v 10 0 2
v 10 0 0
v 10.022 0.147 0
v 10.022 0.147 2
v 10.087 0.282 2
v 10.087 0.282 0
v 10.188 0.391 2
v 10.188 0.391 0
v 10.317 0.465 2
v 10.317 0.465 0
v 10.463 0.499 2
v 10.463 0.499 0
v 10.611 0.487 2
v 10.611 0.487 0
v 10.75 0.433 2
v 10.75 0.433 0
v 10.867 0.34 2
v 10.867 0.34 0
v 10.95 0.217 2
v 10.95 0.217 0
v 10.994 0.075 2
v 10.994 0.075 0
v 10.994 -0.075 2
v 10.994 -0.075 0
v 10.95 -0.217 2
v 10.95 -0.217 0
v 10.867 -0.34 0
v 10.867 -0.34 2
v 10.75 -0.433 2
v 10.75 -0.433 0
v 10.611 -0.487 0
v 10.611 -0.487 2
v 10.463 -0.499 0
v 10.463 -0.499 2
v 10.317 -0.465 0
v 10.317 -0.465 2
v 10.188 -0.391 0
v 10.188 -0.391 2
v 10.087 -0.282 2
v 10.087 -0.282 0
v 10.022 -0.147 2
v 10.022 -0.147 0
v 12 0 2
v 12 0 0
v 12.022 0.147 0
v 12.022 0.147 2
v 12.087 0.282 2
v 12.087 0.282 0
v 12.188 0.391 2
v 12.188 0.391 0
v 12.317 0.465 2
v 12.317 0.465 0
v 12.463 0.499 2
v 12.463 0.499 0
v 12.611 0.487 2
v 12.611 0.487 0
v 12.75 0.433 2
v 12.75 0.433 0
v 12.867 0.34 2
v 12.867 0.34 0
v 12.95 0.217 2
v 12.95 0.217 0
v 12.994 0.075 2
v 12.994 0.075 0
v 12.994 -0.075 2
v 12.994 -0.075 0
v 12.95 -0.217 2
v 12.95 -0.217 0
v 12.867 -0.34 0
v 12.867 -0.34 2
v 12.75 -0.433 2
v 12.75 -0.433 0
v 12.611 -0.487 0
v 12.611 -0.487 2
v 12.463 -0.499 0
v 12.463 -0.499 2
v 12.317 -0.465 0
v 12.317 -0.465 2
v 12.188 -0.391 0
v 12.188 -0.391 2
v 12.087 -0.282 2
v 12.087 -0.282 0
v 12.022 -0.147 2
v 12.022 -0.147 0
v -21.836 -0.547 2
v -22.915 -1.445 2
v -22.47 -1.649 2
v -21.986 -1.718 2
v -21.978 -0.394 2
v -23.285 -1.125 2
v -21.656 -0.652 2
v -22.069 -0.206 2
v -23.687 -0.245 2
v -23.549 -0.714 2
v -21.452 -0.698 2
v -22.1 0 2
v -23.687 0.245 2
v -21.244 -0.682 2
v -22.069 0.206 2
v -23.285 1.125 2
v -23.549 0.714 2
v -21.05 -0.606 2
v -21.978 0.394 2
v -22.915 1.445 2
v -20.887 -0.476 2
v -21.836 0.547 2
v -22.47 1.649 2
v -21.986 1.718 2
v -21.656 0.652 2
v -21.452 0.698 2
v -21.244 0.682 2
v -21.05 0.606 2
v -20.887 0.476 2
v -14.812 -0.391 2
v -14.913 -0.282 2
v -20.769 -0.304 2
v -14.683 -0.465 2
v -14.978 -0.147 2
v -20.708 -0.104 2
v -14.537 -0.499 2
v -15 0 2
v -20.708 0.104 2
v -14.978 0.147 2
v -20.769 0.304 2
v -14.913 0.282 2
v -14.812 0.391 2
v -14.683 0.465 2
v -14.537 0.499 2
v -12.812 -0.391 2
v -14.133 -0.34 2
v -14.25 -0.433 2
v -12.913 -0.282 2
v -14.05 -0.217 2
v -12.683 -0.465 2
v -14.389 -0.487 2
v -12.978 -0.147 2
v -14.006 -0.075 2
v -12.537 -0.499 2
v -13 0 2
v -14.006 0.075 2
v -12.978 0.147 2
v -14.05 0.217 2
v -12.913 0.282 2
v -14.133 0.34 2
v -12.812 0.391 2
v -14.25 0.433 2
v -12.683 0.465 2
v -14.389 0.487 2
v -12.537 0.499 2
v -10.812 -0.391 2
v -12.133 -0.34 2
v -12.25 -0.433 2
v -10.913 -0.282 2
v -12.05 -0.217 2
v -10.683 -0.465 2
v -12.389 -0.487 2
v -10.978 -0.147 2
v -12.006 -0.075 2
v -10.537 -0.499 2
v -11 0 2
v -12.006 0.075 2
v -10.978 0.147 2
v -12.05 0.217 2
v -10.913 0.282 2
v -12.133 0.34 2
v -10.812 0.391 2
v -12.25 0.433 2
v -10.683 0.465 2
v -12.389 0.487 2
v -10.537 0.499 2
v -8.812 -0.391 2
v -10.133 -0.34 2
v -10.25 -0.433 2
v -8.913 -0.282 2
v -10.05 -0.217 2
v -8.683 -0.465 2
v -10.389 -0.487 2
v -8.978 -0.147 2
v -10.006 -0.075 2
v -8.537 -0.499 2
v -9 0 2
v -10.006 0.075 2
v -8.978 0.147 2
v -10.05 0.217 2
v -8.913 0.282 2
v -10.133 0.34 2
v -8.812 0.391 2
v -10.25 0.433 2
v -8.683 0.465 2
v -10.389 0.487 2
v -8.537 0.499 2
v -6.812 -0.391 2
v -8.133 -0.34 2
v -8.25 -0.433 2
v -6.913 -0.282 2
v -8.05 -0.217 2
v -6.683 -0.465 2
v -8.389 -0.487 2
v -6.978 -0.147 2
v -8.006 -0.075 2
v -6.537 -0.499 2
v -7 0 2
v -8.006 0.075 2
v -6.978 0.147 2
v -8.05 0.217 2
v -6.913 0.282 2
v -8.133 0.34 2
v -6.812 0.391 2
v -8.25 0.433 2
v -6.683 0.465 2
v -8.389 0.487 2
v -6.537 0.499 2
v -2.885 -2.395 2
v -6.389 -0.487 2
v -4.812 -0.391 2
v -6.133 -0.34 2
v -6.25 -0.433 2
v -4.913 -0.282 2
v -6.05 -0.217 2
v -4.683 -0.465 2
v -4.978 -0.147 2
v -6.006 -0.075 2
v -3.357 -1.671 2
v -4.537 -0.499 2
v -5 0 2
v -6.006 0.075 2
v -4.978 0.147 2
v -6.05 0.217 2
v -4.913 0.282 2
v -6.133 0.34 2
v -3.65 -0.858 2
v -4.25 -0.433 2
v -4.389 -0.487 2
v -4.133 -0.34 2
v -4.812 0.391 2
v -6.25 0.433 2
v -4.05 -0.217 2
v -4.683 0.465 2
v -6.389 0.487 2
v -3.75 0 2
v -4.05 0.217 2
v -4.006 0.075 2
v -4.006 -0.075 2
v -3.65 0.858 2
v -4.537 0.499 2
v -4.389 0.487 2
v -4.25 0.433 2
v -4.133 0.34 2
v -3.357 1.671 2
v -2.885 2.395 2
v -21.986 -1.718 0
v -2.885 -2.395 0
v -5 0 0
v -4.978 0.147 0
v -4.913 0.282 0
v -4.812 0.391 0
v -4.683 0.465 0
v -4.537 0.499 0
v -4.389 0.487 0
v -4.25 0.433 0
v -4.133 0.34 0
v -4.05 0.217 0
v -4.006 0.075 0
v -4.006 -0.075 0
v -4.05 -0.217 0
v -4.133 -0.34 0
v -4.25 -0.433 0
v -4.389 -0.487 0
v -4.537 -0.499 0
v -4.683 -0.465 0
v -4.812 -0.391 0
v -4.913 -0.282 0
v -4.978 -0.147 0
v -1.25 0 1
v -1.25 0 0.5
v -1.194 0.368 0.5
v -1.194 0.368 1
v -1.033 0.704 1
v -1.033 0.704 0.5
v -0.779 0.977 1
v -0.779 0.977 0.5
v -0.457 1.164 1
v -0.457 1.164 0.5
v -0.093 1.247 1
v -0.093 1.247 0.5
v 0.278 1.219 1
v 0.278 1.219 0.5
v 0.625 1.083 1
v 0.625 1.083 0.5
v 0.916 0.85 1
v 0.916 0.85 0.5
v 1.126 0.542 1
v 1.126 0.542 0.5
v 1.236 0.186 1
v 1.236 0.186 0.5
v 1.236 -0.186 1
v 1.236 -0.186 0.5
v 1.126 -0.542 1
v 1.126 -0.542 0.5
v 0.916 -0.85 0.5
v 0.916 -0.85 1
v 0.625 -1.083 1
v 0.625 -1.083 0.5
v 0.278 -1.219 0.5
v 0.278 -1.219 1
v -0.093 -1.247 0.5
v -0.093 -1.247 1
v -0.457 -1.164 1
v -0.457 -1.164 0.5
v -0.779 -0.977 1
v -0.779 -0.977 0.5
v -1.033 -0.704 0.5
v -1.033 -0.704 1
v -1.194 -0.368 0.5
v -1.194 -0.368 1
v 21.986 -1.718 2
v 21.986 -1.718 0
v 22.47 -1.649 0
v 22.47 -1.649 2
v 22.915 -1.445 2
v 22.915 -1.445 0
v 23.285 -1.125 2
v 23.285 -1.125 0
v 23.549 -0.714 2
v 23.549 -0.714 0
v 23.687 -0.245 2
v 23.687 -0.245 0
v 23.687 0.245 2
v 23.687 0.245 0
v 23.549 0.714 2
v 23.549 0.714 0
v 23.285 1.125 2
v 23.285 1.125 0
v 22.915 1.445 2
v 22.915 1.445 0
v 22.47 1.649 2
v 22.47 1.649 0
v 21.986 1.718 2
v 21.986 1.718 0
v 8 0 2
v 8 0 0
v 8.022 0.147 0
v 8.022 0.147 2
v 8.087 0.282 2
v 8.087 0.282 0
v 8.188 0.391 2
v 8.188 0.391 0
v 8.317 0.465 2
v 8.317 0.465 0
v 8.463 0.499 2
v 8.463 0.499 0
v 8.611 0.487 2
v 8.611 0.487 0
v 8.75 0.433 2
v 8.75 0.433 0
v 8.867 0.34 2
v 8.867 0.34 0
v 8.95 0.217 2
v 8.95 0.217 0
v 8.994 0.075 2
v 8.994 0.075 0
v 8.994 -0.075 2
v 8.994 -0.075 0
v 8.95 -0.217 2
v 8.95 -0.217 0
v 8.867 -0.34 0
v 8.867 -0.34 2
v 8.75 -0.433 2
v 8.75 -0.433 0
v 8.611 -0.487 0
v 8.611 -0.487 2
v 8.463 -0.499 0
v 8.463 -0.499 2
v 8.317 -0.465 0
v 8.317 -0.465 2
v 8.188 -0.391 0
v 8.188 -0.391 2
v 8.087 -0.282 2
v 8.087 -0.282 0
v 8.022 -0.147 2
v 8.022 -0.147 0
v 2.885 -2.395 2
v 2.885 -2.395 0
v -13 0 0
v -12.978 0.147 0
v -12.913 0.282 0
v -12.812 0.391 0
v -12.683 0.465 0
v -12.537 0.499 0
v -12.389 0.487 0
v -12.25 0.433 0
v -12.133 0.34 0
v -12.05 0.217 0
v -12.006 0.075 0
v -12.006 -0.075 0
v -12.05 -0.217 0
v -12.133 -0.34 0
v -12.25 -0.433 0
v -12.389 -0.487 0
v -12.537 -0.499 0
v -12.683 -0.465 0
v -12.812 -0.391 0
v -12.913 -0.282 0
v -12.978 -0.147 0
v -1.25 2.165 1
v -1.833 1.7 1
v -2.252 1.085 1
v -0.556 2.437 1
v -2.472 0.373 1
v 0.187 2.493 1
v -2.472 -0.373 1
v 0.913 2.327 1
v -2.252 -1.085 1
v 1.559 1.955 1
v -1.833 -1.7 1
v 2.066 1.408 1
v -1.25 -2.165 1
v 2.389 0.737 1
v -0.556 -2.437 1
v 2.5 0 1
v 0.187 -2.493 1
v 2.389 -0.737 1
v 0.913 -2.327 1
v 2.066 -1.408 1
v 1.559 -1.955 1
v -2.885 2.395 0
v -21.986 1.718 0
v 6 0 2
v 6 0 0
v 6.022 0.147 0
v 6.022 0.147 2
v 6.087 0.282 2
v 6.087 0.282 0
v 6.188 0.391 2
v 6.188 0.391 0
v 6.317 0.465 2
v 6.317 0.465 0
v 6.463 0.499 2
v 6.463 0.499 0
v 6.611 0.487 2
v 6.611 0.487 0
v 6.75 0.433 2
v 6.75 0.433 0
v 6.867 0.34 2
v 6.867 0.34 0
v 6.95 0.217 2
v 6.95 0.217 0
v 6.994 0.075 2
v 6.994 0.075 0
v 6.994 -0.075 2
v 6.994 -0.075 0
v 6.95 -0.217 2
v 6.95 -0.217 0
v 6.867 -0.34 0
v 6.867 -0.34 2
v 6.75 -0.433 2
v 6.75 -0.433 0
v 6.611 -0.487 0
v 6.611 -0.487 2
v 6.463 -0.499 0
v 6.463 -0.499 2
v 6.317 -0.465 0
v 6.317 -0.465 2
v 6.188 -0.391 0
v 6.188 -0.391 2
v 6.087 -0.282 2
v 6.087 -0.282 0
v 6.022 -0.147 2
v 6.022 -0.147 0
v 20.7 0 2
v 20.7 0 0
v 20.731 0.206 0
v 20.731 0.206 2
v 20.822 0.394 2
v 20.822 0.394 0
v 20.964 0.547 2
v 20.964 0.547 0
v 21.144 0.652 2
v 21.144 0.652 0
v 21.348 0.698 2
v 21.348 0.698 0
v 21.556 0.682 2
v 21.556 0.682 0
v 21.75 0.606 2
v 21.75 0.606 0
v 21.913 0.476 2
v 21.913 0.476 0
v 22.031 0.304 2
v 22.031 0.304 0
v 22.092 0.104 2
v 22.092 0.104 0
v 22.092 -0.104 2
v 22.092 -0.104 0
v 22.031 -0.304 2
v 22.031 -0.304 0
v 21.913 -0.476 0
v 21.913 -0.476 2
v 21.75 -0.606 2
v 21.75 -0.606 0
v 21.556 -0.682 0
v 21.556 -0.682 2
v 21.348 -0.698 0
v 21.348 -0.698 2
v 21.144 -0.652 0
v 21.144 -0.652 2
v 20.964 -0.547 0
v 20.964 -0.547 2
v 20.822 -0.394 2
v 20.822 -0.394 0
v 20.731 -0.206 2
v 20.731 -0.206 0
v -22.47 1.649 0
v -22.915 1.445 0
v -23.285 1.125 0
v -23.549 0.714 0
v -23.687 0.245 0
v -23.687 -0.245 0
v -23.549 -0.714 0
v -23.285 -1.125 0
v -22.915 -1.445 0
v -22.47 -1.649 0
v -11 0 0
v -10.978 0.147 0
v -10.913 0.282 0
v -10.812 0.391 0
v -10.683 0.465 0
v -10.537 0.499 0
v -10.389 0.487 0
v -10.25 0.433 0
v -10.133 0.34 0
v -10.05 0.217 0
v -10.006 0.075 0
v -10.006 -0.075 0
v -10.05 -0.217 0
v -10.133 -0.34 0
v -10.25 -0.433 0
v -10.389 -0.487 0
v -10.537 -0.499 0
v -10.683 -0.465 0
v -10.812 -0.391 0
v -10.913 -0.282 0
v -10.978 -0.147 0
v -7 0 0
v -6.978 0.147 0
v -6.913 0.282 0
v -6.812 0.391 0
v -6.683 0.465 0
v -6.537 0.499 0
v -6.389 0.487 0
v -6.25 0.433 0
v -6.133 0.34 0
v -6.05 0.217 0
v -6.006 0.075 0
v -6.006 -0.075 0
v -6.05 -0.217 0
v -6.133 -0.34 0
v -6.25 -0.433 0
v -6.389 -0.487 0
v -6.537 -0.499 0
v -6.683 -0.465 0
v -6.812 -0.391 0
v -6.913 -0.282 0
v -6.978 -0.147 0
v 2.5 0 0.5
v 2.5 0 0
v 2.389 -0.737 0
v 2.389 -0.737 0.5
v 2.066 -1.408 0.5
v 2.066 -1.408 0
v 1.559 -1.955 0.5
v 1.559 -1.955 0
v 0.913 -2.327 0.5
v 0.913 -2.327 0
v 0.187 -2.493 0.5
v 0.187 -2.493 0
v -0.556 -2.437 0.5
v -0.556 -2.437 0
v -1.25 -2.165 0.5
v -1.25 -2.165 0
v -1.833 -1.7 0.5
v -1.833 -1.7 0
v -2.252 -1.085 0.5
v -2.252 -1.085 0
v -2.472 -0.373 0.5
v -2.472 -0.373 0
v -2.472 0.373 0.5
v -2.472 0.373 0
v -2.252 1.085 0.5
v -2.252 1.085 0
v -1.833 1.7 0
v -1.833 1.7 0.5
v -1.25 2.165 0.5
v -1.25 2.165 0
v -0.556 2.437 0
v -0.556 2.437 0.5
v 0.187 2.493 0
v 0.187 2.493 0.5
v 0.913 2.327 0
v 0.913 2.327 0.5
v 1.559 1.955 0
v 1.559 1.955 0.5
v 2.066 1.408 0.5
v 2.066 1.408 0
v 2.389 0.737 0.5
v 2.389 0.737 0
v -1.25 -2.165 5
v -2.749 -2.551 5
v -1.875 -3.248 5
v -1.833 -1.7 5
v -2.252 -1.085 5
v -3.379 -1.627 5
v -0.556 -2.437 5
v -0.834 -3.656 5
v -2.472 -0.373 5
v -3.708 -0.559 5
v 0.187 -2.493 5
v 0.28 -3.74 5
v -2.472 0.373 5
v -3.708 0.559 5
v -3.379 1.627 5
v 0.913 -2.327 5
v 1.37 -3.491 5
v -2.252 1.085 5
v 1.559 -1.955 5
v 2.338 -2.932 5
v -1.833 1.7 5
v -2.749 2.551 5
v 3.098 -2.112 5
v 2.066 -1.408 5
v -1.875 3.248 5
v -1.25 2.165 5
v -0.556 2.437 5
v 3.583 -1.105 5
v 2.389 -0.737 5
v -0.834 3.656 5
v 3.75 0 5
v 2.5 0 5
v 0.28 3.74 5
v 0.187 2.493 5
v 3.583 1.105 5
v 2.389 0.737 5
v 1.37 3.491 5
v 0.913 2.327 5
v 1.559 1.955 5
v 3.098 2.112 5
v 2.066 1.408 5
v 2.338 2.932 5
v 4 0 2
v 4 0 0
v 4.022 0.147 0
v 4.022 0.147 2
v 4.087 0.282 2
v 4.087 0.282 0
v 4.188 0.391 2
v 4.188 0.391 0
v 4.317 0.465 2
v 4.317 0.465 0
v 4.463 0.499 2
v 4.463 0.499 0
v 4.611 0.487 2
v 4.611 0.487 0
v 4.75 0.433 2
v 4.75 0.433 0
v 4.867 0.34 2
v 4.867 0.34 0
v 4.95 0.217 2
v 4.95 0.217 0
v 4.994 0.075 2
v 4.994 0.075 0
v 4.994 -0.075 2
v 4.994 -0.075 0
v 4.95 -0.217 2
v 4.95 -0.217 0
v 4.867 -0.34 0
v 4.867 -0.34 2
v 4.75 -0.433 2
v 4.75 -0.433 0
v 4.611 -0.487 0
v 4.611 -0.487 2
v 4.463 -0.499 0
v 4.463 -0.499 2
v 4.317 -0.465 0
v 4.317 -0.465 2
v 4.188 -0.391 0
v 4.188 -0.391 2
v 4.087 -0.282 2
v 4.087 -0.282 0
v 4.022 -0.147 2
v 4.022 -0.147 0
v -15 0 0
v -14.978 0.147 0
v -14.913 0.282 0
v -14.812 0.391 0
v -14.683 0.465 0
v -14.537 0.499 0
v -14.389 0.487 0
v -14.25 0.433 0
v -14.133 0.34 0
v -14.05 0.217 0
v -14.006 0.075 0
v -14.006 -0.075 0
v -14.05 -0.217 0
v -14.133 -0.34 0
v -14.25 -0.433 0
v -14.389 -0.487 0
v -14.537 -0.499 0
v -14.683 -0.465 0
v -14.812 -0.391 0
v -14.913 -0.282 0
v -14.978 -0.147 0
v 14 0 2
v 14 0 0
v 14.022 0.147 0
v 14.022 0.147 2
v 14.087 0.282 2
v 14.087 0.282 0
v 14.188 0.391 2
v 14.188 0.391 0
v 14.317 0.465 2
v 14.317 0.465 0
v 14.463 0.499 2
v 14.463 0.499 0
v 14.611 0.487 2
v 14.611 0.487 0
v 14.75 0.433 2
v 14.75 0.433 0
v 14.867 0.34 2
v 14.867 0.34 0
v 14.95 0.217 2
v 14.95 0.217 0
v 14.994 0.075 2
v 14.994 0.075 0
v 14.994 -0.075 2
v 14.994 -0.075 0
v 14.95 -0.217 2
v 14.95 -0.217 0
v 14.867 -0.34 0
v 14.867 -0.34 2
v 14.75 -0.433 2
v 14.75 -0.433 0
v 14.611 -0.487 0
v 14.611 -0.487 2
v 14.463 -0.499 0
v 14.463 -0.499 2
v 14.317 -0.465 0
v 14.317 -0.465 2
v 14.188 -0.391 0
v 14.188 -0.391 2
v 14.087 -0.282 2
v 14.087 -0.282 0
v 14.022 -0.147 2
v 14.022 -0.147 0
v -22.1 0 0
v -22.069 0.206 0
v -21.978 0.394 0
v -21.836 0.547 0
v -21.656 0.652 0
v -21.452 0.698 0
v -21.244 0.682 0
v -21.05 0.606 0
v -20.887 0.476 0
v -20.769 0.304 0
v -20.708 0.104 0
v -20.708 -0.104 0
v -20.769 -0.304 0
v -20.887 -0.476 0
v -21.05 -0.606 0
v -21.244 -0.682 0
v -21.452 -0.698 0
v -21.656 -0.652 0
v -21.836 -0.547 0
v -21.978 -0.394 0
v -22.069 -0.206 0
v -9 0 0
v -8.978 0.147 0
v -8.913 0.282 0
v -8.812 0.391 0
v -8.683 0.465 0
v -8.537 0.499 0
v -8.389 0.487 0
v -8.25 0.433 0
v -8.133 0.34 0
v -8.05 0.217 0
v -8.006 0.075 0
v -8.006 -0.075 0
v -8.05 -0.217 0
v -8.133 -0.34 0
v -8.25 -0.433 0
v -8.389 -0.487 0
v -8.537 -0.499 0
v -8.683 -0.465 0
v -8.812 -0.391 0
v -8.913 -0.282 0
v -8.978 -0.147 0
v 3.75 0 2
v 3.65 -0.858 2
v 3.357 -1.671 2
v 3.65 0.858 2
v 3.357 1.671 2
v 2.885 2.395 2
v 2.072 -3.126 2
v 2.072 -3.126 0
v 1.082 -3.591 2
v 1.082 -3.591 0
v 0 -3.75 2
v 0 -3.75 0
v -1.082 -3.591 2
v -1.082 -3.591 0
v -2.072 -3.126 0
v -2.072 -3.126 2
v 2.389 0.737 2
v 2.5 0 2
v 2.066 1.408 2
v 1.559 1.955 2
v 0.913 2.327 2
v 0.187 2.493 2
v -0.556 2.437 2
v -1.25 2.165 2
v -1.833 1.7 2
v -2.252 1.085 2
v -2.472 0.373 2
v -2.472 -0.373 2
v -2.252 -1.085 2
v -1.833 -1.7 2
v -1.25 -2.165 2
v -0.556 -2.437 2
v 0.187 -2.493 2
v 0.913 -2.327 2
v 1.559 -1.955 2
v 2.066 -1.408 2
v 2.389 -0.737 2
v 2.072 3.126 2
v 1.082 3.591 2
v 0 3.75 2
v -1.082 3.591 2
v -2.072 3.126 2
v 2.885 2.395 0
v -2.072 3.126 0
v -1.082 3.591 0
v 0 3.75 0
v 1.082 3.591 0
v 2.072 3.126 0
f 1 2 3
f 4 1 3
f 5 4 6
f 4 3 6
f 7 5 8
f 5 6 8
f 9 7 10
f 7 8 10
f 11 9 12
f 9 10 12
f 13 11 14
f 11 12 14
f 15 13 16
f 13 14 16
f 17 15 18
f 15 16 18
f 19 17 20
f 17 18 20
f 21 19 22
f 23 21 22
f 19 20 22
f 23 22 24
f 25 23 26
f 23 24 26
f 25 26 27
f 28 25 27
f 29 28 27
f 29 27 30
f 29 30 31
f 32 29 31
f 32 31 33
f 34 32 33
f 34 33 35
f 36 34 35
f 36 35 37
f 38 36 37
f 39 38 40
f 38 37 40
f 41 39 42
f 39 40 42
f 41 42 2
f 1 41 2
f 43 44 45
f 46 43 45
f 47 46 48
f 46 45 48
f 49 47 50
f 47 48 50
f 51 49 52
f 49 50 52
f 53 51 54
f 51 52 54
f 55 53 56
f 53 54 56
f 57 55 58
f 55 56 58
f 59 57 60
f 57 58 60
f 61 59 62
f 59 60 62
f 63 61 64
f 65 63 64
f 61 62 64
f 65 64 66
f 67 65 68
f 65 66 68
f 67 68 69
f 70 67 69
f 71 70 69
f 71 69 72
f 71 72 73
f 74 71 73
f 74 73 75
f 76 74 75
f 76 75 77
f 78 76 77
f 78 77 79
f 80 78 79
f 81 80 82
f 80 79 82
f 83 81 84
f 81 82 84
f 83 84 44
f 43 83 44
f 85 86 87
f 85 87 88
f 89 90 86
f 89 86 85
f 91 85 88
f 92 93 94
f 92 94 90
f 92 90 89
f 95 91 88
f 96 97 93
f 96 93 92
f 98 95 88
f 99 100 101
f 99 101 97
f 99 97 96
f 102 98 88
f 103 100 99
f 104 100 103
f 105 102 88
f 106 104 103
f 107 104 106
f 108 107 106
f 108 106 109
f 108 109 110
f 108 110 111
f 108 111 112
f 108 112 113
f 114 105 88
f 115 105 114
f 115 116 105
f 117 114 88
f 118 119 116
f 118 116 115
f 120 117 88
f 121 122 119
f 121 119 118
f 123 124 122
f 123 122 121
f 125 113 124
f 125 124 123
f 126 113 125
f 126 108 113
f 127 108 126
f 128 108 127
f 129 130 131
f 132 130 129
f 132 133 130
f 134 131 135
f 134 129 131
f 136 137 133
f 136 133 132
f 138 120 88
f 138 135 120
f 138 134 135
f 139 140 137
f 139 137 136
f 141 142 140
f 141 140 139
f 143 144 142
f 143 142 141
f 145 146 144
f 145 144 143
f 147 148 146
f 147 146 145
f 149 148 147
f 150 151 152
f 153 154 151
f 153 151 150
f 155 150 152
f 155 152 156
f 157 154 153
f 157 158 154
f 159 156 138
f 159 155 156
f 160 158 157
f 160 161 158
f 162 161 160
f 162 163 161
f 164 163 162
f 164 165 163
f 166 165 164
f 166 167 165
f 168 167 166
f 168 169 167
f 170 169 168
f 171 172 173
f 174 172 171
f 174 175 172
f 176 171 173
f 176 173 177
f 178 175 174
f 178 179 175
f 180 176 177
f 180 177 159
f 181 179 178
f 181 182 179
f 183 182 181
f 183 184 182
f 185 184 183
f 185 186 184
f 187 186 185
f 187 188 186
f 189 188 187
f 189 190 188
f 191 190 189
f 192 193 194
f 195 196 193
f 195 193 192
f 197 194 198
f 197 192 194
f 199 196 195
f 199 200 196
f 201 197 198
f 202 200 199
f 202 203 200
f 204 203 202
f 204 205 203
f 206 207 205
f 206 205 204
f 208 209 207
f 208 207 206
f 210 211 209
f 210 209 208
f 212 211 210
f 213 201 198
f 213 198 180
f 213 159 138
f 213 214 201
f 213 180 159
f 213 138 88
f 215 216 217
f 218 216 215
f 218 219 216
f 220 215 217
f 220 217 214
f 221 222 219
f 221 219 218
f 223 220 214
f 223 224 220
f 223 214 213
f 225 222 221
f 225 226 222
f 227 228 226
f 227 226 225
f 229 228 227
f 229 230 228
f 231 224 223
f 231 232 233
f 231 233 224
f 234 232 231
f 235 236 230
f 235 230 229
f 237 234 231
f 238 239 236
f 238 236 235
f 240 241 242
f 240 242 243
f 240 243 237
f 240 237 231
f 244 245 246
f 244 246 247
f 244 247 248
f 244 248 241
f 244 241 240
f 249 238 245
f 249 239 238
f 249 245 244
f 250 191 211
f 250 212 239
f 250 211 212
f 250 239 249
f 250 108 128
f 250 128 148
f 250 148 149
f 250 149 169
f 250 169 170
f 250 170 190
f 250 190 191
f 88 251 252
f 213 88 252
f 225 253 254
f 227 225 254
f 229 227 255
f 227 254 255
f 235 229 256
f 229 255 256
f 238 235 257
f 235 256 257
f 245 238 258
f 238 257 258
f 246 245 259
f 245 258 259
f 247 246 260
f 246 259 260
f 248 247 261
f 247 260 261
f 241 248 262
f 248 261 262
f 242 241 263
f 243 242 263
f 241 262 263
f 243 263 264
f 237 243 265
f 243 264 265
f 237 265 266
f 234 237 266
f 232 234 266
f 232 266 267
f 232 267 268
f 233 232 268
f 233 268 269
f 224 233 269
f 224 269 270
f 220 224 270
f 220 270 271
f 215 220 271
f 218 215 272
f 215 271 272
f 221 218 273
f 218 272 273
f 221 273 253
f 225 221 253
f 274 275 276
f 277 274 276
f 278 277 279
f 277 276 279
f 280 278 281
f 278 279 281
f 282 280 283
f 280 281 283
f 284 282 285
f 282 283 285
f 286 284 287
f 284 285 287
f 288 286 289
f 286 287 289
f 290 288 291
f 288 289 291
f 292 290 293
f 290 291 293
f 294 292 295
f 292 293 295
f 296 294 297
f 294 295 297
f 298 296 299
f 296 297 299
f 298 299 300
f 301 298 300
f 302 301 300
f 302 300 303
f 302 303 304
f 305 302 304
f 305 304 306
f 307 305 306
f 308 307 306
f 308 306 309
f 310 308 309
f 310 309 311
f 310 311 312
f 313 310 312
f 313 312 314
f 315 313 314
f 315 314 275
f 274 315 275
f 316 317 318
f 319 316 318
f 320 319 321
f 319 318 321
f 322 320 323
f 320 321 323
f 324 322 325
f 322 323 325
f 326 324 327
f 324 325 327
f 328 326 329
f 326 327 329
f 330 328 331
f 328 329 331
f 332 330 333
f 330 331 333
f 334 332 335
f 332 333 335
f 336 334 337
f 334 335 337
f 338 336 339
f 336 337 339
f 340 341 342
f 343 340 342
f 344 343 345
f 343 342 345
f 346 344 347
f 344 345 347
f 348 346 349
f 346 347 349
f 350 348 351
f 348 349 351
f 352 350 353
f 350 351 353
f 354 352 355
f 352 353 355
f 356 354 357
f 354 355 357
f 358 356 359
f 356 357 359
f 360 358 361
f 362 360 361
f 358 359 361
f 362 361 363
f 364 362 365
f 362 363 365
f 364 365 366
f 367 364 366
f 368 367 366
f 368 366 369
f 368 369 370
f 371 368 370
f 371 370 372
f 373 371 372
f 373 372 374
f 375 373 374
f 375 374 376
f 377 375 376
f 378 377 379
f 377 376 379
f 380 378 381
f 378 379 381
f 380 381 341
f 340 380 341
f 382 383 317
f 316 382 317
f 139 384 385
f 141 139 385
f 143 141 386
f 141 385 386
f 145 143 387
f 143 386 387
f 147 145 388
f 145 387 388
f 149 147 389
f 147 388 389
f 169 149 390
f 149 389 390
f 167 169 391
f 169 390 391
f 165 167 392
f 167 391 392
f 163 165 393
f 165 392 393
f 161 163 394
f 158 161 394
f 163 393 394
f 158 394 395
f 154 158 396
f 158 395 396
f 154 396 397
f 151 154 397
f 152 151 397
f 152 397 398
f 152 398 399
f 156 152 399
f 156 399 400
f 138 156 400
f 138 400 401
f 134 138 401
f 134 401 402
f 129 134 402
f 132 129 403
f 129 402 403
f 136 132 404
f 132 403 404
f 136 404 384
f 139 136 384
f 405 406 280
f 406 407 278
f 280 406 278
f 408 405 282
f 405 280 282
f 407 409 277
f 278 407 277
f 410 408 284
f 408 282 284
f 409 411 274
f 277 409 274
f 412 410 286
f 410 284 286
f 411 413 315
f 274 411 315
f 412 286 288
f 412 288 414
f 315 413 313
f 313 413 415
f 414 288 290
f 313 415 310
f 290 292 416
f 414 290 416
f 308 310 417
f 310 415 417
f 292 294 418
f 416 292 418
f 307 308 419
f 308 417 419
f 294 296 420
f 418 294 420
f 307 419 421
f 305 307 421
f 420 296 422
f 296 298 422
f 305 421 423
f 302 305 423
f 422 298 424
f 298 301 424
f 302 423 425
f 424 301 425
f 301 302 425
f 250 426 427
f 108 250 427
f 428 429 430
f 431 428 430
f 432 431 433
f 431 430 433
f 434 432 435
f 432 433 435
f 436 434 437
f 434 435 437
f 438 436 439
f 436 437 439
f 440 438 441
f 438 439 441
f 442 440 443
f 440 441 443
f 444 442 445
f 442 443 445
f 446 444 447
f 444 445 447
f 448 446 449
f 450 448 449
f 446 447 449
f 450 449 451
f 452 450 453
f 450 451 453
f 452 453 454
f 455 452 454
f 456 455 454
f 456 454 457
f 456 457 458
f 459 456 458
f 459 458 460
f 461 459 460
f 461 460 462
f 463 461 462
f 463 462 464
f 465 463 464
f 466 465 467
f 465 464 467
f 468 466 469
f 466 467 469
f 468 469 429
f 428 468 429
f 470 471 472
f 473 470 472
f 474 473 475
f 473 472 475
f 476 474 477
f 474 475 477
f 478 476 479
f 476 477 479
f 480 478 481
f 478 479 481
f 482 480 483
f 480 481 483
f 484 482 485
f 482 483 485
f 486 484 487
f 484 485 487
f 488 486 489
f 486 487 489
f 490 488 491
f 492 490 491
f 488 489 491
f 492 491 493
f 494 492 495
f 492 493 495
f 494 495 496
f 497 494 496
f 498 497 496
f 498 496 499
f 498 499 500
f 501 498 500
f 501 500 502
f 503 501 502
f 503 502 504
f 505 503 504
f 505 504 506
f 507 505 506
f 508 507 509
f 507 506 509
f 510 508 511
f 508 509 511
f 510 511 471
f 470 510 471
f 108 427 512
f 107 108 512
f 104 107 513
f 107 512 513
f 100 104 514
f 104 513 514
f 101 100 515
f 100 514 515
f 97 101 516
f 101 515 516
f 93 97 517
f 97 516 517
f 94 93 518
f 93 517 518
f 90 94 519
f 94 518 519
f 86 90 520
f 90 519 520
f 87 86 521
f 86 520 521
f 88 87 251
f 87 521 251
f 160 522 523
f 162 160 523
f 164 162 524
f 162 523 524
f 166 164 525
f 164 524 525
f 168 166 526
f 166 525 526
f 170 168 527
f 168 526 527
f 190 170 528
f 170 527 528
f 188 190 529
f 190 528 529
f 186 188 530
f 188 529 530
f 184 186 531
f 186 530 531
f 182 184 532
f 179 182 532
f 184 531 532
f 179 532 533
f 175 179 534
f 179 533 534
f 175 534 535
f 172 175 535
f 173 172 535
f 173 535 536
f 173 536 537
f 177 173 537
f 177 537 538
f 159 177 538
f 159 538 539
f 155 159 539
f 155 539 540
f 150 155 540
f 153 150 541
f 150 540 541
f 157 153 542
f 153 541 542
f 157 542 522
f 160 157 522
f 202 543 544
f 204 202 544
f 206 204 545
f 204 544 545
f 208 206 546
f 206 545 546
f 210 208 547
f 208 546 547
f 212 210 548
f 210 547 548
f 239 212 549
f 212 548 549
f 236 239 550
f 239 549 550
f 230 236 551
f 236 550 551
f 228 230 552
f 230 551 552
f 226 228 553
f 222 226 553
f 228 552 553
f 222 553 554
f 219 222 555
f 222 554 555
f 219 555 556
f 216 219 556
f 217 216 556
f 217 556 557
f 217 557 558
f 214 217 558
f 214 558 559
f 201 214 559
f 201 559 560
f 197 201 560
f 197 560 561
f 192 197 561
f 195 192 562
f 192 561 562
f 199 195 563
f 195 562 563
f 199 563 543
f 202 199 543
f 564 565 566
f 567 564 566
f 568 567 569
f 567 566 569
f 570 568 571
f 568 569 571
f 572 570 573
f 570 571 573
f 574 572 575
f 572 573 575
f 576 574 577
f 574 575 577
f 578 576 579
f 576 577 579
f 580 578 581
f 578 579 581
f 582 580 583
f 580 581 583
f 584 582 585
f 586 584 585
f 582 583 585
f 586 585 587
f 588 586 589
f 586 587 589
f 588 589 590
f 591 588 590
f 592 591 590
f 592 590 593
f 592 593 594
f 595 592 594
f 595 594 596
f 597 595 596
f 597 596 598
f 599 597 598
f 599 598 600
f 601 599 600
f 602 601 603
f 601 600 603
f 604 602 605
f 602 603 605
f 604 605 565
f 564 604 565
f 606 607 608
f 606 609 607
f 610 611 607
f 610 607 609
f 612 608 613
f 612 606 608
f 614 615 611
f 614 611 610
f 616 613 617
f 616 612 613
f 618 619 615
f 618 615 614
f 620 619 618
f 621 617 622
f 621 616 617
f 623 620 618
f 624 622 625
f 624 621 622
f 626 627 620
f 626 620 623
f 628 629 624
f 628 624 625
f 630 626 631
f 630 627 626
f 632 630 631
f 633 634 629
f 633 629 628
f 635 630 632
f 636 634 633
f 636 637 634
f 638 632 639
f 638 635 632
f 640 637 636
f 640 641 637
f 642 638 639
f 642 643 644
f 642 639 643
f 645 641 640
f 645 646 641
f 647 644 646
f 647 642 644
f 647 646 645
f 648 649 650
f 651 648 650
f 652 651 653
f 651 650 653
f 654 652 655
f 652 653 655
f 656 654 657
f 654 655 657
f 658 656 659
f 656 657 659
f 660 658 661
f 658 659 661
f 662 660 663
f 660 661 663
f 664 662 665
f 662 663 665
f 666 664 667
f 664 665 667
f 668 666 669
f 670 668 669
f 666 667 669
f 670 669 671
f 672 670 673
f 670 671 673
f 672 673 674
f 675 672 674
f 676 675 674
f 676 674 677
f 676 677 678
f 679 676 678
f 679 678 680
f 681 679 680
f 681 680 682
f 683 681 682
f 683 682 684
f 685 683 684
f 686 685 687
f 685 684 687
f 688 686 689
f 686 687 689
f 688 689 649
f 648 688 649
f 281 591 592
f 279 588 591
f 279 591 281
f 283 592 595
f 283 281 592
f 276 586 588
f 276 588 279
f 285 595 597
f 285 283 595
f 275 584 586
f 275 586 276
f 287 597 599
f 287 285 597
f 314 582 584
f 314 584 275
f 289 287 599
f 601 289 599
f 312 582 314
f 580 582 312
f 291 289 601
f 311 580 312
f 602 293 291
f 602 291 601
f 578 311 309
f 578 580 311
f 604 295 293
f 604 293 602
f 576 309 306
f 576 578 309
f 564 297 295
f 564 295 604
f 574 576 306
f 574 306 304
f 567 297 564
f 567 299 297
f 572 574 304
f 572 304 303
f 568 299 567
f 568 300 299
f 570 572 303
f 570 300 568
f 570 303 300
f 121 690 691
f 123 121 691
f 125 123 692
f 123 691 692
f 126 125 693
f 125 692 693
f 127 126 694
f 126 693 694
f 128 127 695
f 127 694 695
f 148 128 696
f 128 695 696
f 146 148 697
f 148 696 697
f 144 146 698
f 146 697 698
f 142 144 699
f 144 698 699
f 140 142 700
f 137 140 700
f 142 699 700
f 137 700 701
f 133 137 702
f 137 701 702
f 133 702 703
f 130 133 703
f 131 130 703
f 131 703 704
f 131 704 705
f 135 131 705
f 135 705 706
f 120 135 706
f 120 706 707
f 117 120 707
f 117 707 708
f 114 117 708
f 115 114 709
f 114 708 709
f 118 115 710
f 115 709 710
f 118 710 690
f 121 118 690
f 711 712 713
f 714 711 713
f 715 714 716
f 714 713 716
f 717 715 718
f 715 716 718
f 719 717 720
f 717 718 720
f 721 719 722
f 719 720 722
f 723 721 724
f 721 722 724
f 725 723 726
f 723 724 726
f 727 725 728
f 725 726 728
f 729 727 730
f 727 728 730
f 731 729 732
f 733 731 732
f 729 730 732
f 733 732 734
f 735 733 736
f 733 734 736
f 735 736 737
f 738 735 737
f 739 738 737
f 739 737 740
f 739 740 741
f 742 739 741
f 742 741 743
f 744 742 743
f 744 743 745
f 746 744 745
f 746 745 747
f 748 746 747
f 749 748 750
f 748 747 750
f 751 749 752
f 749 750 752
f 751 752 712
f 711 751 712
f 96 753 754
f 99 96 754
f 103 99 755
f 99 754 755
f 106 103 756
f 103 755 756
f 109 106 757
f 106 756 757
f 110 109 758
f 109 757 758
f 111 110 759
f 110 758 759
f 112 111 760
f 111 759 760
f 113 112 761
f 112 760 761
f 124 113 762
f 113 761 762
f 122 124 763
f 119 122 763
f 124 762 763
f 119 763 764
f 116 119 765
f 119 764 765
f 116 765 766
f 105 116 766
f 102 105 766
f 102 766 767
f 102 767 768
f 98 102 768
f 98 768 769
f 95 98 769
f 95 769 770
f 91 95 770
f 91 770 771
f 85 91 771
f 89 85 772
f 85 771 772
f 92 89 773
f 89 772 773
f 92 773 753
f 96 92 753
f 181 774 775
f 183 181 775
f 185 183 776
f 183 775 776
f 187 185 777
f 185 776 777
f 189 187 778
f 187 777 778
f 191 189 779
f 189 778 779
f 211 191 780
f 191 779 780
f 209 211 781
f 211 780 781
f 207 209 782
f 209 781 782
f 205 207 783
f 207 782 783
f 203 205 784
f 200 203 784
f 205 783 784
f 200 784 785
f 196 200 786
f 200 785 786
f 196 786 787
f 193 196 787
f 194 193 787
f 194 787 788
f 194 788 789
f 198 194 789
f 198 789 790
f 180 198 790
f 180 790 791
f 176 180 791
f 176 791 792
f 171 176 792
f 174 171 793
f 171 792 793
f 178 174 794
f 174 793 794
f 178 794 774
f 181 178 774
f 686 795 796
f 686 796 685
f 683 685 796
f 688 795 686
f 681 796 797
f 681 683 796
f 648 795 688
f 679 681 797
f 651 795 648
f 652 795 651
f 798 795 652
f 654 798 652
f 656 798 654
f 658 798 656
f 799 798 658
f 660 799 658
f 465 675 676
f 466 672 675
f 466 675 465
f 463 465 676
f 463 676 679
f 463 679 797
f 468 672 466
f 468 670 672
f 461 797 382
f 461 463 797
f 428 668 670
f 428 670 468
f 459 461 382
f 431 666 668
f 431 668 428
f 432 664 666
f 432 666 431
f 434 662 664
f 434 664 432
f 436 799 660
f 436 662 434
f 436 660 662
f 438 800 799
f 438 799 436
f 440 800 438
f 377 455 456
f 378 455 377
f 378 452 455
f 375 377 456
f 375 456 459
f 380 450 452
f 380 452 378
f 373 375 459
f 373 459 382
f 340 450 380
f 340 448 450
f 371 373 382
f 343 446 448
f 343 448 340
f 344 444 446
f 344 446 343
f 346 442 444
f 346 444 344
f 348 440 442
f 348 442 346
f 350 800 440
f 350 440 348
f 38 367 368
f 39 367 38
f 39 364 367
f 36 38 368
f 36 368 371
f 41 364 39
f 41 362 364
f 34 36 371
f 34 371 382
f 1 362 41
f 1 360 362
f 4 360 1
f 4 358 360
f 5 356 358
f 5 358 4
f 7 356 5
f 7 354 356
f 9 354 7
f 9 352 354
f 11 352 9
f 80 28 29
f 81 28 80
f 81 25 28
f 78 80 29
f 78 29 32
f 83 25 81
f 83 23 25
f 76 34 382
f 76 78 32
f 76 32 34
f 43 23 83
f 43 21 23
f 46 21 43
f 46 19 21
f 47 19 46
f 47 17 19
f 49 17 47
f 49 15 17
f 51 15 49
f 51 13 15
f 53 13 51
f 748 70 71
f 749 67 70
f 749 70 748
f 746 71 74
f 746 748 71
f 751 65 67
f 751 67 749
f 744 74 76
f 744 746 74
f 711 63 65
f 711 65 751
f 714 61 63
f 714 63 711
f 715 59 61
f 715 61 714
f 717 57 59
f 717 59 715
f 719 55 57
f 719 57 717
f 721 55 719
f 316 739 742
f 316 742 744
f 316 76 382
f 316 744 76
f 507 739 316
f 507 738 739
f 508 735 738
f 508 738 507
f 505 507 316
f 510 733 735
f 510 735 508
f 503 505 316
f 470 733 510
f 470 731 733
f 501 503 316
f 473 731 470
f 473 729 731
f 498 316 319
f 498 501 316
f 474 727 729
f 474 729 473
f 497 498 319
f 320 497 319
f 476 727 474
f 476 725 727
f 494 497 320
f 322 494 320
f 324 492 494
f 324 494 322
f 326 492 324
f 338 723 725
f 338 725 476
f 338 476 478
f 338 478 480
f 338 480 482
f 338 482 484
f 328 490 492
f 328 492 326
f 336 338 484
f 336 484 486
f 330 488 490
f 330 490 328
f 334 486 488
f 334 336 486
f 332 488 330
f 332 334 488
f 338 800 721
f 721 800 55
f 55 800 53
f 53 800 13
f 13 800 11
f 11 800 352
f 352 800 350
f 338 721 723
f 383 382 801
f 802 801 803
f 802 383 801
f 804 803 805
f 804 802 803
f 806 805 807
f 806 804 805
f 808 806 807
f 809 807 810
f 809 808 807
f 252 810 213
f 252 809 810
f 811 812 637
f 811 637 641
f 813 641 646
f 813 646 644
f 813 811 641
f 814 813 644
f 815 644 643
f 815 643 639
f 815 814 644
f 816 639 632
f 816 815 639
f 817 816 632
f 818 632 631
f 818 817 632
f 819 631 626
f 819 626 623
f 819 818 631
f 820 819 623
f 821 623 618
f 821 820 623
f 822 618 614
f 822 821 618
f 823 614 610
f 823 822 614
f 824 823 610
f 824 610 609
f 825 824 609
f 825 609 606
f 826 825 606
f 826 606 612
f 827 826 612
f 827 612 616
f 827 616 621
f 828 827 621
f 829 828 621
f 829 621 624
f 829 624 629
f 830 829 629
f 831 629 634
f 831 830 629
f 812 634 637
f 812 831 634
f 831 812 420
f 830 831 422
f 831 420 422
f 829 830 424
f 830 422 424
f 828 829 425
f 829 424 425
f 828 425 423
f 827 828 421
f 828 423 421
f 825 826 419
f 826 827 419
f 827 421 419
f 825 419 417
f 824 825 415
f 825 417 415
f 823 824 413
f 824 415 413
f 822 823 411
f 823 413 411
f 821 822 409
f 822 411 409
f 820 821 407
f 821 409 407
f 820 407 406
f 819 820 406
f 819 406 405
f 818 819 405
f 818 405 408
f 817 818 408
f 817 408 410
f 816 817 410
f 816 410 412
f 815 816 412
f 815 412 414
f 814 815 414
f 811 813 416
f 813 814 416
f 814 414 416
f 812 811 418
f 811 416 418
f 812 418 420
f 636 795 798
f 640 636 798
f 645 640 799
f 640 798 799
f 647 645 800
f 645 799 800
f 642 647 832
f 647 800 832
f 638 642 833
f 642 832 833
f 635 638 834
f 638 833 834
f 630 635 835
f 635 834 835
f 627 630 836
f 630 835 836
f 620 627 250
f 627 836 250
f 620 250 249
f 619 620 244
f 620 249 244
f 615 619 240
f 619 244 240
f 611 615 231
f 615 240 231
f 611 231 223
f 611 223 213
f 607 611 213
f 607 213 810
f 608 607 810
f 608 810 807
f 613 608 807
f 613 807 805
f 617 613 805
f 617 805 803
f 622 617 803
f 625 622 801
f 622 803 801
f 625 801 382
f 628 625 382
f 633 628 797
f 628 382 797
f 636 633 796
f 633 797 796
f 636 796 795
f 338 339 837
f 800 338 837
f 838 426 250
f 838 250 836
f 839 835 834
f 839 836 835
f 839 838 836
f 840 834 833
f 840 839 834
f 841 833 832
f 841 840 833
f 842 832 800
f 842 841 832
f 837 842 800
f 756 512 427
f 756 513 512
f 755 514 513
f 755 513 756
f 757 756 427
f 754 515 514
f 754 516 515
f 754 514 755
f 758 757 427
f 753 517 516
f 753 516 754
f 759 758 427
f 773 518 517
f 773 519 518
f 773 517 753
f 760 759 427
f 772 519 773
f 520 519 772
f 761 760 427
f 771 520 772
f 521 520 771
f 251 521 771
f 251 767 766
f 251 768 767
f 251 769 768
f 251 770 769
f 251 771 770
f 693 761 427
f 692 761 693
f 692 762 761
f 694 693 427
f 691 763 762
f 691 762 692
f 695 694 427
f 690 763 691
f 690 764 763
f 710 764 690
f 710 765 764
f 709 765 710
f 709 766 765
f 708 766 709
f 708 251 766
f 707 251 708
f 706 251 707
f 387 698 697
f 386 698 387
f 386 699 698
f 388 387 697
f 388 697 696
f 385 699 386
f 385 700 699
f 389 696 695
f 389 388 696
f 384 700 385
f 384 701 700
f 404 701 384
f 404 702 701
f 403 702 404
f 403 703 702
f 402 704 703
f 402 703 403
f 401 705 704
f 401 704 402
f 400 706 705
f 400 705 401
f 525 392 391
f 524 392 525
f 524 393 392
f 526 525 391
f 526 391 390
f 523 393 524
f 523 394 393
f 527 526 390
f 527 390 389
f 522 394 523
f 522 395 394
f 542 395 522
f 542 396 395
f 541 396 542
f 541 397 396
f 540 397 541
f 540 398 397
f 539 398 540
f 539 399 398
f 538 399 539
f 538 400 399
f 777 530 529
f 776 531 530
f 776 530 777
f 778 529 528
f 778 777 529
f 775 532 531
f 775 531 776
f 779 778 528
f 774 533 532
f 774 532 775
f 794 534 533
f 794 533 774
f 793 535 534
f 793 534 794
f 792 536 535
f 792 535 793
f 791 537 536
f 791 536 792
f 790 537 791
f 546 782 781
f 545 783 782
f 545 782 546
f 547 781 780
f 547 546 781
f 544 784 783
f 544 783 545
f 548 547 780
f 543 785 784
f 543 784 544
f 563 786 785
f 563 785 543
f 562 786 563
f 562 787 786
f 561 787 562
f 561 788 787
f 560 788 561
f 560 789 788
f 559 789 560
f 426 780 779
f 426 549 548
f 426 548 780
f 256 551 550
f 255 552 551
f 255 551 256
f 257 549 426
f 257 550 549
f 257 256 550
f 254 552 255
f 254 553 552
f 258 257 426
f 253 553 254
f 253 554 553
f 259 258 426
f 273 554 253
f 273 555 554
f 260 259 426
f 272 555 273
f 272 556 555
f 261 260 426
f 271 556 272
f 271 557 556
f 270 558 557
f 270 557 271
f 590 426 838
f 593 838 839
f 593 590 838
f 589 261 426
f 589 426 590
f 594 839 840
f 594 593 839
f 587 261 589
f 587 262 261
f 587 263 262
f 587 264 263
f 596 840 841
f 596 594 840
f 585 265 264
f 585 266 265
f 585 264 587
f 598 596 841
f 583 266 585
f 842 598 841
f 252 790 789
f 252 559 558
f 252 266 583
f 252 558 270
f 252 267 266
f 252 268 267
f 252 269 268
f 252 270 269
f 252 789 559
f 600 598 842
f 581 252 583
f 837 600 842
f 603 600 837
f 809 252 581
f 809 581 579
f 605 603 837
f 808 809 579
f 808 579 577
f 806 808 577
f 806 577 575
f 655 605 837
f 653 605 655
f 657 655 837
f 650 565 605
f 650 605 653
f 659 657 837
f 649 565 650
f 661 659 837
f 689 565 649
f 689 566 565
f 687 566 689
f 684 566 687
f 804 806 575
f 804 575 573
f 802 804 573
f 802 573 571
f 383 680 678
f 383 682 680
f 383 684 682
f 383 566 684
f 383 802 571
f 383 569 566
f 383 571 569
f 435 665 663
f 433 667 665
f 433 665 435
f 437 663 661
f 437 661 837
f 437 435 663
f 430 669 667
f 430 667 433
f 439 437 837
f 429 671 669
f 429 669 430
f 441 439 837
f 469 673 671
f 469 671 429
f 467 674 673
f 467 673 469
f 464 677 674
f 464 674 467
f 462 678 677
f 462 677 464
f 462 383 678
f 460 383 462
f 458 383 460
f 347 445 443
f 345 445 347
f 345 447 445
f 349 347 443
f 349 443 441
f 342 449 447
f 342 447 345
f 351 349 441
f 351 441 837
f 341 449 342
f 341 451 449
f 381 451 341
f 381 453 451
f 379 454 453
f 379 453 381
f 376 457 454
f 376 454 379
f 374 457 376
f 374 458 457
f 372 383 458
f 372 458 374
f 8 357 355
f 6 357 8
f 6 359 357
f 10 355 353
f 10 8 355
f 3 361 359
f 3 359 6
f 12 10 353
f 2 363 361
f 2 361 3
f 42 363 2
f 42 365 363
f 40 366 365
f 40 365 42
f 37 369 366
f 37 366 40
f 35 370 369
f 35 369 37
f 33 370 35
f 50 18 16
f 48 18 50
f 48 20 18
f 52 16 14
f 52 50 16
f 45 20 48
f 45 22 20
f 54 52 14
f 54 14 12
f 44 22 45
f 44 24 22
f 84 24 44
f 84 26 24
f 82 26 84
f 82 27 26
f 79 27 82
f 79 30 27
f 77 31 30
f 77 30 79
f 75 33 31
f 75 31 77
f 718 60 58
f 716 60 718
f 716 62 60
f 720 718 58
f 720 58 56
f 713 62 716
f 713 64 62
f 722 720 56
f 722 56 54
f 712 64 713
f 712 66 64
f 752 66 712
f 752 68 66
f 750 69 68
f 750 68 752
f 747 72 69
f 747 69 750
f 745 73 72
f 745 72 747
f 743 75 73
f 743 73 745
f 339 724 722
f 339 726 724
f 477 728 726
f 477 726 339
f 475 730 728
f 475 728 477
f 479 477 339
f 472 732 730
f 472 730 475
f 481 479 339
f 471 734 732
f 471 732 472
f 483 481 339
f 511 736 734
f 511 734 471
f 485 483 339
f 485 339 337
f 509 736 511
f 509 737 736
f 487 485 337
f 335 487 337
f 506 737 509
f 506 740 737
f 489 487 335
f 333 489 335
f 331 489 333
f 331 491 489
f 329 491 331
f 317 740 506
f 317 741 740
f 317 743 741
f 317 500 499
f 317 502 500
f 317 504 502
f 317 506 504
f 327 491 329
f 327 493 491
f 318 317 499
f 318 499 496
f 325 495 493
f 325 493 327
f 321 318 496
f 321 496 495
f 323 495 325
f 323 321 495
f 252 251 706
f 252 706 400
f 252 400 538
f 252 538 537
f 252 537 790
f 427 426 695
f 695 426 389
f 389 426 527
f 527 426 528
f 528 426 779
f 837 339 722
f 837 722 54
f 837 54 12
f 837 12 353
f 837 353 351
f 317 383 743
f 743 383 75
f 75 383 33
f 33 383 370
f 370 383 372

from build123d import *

# Parameters (mm, degrees)
EXTRUDE_3_DEPTH     = 2
EXTRUDE_3_2_DEPTH   = 2
SKETCH_2_R          = 3.75
SKETCH_2_R_2        = 2.5
EXTRUDE_5_DEPTH     = 3
EXTRUDE_START       = 2
SKETCH_3_R          = 3.75
SKETCH_3_R_2        = 2.5
EXTRUDE_6_DEPTH     = 2
SKETCH_4_R          = 0.5
CUT_EXTRUDE_1_DEPTH = 2
SKETCH_5_R          = 2.5
EXTRUDE_7_DEPTH     = 1
SKETCH_6_R          = 2.5
CUT_EXTRUDE_2_DEPTH = 0.5
SKETCH_7_R          = 1.25
CUT_EXTRUDE_3_DEPTH = 5
SKETCH4_R           = 0.7
CUT_EXTRUDE3_DEPTH  = 2
SKETCH5_R           = 0.7
CUT_EXTRUDE4_DEPTH  = 2


with BuildPart() as part:
    # Эскиз1 → Бобышка-Вытянуть3 (new body)
    with BuildSketch(Plane.XY):
        with BuildLine():
            ThreePointArc((-2.88547071, -2.395111434), (-3.527252129, -1.273182005), (-3.75, 0))
            ThreePointArc((-3.75, 0), (-3.527252129, 1.273182005), (-2.88547071, 2.395111434))
            Line((-2.88547071, 2.395111434), (-21.986200069, 1.718255157))
            ThreePointArc((-21.986200069, 1.718255157), (-23.704455226, 0), (-21.986200069, -1.718255157))
            Line((-21.986200069, -1.718255157), (-2.88547071, -2.395111434))
        make_face()
    extrude(amount=EXTRUDE_3_DEPTH)



with BuildPart() as body_2:
    # Эскиз1 → Extrude 3 2 (new body)
    with BuildSketch(Plane.XY):
        with BuildLine():
            Line((21.986200069, 1.718255157), (2.88547071, 2.395111434))
            ThreePointArc((2.88547071, 2.395111434), (3.75, 0), (2.88547071, -2.395111434))
            Line((2.88547071, -2.395111434), (21.986200069, -1.718255157))
            ThreePointArc((21.986200069, -1.718255157), (23.704455226, 0), (21.986200069, 1.718255157))
        make_face()
    extrude(amount=EXTRUDE_3_2_DEPTH)


with BuildPart() as body_3:
    # Эскиз2 → Бобышка-Вытянуть5 (new body)
    with BuildSketch(Plane.XY.offset(2)):
        Circle(SKETCH_2_R)
        Circle(SKETCH_2_R_2, mode=Mode.SUBTRACT)
    extrude(amount=EXTRUDE_5_DEPTH)


with BuildPart() as part_1:
    add(part.part)

    add(body_2.part)  # Бобышка-Вытянуть6 merges body 2

    add(body_3.part)  # Бобышка-Вытянуть6 merges body 3
    # Эскиз3 → Бобышка-Вытянуть6 (add)
    with BuildSketch(Plane(origin=(0, 0, 2), x_dir=(-1, 0, 0), z_dir=(0, 0, -1)).offset(EXTRUDE_START)):
        with Locations(Location((0, 0, 0), (0, 0, 180))):
            Circle(SKETCH_3_R)
        with Locations(Location((0, 0, 0), (0, 0, 180))):
            Circle(SKETCH_3_R_2, mode=Mode.SUBTRACT)
    extrude(amount=-EXTRUDE_6_DEPTH)

    # Эскиз4 → Вырез-Вытянуть1 (cut)
    with BuildSketch(Plane(origin=(0, 0, 0), x_dir=(-1, 0, 0), z_dir=(0, 0, -1))):
        with Locations((-14.5, 0)):
            Circle(SKETCH_4_R)
        with Locations((-4.5, 0)):
            Circle(SKETCH_4_R)
        with Locations((-6.5, 0)):
            Circle(SKETCH_4_R)
        with Locations((-8.5, 0)):
            Circle(SKETCH_4_R)
        with Locations((-10.5, 0)):
            Circle(SKETCH_4_R)
        with Locations((-12.5, 0)):
            Circle(SKETCH_4_R)
        with Locations((4.5, 0)):
            Circle(SKETCH_4_R)
        with Locations((6.5, 0)):
            Circle(SKETCH_4_R)
        with Locations((8.5, 0)):
            Circle(SKETCH_4_R)
        with Locations((10.5, 0)):
            Circle(SKETCH_4_R)
        with Locations((12.5, 0)):
            Circle(SKETCH_4_R)
        with Locations((14.5, 0)):
            Circle(SKETCH_4_R)
    extrude(amount=-CUT_EXTRUDE_1_DEPTH, mode=Mode.SUBTRACT)

    # Эскиз5 → Бобышка-Вытянуть7 (add)
    with BuildSketch(Plane(origin=(0, 0, 0), x_dir=(-1, 0, 0), z_dir=(0, 0, -1))):
        with Locations(Location((0, 0, 0), (0, 0, 180))):
            Circle(SKETCH_5_R)
    extrude(amount=-EXTRUDE_7_DEPTH)

    # Эскиз6 → Вырез-Вытянуть2 (cut)
    with BuildSketch(Plane(origin=(0, 0, 0), x_dir=(-1, 0, 0), z_dir=(0, 0, -1))):
        with Locations(Location((0, 0, 0), (0, 0, 180))):
            Circle(SKETCH_6_R)
    extrude(amount=-CUT_EXTRUDE_2_DEPTH, mode=Mode.SUBTRACT)

    # Эскиз7 → Вырез-Вытянуть3 (cut)
    with BuildSketch(Plane(origin=(0, 0, 0.5), x_dir=(-1, 0, 0), z_dir=(0, 0, -1))):
        Circle(SKETCH_7_R)
    extrude(amount=-CUT_EXTRUDE_3_DEPTH, mode=Mode.SUBTRACT)

    # Sketch4 → Cut-Extrude3 (cut)
    with BuildSketch(Plane(origin=(0, 0, 0), x_dir=(-1, 0, 0), z_dir=(0, 0, -1))):
        with Locations((21.4, 0)):
            Circle(SKETCH4_R)
    extrude(amount=-CUT_EXTRUDE3_DEPTH, mode=Mode.SUBTRACT)

    # Sketch5 → Cut-Extrude4 (cut)
    with BuildSketch(Plane(origin=(0, 0, 0), x_dir=(-1, 0, 0), z_dir=(0, 0, -1))):
        with Locations((-21.4, 0)):
            Circle(SKETCH5_R)
    extrude(amount=-CUT_EXTRUDE4_DEPTH, mode=Mode.SUBTRACT)


solid = part_1.part
